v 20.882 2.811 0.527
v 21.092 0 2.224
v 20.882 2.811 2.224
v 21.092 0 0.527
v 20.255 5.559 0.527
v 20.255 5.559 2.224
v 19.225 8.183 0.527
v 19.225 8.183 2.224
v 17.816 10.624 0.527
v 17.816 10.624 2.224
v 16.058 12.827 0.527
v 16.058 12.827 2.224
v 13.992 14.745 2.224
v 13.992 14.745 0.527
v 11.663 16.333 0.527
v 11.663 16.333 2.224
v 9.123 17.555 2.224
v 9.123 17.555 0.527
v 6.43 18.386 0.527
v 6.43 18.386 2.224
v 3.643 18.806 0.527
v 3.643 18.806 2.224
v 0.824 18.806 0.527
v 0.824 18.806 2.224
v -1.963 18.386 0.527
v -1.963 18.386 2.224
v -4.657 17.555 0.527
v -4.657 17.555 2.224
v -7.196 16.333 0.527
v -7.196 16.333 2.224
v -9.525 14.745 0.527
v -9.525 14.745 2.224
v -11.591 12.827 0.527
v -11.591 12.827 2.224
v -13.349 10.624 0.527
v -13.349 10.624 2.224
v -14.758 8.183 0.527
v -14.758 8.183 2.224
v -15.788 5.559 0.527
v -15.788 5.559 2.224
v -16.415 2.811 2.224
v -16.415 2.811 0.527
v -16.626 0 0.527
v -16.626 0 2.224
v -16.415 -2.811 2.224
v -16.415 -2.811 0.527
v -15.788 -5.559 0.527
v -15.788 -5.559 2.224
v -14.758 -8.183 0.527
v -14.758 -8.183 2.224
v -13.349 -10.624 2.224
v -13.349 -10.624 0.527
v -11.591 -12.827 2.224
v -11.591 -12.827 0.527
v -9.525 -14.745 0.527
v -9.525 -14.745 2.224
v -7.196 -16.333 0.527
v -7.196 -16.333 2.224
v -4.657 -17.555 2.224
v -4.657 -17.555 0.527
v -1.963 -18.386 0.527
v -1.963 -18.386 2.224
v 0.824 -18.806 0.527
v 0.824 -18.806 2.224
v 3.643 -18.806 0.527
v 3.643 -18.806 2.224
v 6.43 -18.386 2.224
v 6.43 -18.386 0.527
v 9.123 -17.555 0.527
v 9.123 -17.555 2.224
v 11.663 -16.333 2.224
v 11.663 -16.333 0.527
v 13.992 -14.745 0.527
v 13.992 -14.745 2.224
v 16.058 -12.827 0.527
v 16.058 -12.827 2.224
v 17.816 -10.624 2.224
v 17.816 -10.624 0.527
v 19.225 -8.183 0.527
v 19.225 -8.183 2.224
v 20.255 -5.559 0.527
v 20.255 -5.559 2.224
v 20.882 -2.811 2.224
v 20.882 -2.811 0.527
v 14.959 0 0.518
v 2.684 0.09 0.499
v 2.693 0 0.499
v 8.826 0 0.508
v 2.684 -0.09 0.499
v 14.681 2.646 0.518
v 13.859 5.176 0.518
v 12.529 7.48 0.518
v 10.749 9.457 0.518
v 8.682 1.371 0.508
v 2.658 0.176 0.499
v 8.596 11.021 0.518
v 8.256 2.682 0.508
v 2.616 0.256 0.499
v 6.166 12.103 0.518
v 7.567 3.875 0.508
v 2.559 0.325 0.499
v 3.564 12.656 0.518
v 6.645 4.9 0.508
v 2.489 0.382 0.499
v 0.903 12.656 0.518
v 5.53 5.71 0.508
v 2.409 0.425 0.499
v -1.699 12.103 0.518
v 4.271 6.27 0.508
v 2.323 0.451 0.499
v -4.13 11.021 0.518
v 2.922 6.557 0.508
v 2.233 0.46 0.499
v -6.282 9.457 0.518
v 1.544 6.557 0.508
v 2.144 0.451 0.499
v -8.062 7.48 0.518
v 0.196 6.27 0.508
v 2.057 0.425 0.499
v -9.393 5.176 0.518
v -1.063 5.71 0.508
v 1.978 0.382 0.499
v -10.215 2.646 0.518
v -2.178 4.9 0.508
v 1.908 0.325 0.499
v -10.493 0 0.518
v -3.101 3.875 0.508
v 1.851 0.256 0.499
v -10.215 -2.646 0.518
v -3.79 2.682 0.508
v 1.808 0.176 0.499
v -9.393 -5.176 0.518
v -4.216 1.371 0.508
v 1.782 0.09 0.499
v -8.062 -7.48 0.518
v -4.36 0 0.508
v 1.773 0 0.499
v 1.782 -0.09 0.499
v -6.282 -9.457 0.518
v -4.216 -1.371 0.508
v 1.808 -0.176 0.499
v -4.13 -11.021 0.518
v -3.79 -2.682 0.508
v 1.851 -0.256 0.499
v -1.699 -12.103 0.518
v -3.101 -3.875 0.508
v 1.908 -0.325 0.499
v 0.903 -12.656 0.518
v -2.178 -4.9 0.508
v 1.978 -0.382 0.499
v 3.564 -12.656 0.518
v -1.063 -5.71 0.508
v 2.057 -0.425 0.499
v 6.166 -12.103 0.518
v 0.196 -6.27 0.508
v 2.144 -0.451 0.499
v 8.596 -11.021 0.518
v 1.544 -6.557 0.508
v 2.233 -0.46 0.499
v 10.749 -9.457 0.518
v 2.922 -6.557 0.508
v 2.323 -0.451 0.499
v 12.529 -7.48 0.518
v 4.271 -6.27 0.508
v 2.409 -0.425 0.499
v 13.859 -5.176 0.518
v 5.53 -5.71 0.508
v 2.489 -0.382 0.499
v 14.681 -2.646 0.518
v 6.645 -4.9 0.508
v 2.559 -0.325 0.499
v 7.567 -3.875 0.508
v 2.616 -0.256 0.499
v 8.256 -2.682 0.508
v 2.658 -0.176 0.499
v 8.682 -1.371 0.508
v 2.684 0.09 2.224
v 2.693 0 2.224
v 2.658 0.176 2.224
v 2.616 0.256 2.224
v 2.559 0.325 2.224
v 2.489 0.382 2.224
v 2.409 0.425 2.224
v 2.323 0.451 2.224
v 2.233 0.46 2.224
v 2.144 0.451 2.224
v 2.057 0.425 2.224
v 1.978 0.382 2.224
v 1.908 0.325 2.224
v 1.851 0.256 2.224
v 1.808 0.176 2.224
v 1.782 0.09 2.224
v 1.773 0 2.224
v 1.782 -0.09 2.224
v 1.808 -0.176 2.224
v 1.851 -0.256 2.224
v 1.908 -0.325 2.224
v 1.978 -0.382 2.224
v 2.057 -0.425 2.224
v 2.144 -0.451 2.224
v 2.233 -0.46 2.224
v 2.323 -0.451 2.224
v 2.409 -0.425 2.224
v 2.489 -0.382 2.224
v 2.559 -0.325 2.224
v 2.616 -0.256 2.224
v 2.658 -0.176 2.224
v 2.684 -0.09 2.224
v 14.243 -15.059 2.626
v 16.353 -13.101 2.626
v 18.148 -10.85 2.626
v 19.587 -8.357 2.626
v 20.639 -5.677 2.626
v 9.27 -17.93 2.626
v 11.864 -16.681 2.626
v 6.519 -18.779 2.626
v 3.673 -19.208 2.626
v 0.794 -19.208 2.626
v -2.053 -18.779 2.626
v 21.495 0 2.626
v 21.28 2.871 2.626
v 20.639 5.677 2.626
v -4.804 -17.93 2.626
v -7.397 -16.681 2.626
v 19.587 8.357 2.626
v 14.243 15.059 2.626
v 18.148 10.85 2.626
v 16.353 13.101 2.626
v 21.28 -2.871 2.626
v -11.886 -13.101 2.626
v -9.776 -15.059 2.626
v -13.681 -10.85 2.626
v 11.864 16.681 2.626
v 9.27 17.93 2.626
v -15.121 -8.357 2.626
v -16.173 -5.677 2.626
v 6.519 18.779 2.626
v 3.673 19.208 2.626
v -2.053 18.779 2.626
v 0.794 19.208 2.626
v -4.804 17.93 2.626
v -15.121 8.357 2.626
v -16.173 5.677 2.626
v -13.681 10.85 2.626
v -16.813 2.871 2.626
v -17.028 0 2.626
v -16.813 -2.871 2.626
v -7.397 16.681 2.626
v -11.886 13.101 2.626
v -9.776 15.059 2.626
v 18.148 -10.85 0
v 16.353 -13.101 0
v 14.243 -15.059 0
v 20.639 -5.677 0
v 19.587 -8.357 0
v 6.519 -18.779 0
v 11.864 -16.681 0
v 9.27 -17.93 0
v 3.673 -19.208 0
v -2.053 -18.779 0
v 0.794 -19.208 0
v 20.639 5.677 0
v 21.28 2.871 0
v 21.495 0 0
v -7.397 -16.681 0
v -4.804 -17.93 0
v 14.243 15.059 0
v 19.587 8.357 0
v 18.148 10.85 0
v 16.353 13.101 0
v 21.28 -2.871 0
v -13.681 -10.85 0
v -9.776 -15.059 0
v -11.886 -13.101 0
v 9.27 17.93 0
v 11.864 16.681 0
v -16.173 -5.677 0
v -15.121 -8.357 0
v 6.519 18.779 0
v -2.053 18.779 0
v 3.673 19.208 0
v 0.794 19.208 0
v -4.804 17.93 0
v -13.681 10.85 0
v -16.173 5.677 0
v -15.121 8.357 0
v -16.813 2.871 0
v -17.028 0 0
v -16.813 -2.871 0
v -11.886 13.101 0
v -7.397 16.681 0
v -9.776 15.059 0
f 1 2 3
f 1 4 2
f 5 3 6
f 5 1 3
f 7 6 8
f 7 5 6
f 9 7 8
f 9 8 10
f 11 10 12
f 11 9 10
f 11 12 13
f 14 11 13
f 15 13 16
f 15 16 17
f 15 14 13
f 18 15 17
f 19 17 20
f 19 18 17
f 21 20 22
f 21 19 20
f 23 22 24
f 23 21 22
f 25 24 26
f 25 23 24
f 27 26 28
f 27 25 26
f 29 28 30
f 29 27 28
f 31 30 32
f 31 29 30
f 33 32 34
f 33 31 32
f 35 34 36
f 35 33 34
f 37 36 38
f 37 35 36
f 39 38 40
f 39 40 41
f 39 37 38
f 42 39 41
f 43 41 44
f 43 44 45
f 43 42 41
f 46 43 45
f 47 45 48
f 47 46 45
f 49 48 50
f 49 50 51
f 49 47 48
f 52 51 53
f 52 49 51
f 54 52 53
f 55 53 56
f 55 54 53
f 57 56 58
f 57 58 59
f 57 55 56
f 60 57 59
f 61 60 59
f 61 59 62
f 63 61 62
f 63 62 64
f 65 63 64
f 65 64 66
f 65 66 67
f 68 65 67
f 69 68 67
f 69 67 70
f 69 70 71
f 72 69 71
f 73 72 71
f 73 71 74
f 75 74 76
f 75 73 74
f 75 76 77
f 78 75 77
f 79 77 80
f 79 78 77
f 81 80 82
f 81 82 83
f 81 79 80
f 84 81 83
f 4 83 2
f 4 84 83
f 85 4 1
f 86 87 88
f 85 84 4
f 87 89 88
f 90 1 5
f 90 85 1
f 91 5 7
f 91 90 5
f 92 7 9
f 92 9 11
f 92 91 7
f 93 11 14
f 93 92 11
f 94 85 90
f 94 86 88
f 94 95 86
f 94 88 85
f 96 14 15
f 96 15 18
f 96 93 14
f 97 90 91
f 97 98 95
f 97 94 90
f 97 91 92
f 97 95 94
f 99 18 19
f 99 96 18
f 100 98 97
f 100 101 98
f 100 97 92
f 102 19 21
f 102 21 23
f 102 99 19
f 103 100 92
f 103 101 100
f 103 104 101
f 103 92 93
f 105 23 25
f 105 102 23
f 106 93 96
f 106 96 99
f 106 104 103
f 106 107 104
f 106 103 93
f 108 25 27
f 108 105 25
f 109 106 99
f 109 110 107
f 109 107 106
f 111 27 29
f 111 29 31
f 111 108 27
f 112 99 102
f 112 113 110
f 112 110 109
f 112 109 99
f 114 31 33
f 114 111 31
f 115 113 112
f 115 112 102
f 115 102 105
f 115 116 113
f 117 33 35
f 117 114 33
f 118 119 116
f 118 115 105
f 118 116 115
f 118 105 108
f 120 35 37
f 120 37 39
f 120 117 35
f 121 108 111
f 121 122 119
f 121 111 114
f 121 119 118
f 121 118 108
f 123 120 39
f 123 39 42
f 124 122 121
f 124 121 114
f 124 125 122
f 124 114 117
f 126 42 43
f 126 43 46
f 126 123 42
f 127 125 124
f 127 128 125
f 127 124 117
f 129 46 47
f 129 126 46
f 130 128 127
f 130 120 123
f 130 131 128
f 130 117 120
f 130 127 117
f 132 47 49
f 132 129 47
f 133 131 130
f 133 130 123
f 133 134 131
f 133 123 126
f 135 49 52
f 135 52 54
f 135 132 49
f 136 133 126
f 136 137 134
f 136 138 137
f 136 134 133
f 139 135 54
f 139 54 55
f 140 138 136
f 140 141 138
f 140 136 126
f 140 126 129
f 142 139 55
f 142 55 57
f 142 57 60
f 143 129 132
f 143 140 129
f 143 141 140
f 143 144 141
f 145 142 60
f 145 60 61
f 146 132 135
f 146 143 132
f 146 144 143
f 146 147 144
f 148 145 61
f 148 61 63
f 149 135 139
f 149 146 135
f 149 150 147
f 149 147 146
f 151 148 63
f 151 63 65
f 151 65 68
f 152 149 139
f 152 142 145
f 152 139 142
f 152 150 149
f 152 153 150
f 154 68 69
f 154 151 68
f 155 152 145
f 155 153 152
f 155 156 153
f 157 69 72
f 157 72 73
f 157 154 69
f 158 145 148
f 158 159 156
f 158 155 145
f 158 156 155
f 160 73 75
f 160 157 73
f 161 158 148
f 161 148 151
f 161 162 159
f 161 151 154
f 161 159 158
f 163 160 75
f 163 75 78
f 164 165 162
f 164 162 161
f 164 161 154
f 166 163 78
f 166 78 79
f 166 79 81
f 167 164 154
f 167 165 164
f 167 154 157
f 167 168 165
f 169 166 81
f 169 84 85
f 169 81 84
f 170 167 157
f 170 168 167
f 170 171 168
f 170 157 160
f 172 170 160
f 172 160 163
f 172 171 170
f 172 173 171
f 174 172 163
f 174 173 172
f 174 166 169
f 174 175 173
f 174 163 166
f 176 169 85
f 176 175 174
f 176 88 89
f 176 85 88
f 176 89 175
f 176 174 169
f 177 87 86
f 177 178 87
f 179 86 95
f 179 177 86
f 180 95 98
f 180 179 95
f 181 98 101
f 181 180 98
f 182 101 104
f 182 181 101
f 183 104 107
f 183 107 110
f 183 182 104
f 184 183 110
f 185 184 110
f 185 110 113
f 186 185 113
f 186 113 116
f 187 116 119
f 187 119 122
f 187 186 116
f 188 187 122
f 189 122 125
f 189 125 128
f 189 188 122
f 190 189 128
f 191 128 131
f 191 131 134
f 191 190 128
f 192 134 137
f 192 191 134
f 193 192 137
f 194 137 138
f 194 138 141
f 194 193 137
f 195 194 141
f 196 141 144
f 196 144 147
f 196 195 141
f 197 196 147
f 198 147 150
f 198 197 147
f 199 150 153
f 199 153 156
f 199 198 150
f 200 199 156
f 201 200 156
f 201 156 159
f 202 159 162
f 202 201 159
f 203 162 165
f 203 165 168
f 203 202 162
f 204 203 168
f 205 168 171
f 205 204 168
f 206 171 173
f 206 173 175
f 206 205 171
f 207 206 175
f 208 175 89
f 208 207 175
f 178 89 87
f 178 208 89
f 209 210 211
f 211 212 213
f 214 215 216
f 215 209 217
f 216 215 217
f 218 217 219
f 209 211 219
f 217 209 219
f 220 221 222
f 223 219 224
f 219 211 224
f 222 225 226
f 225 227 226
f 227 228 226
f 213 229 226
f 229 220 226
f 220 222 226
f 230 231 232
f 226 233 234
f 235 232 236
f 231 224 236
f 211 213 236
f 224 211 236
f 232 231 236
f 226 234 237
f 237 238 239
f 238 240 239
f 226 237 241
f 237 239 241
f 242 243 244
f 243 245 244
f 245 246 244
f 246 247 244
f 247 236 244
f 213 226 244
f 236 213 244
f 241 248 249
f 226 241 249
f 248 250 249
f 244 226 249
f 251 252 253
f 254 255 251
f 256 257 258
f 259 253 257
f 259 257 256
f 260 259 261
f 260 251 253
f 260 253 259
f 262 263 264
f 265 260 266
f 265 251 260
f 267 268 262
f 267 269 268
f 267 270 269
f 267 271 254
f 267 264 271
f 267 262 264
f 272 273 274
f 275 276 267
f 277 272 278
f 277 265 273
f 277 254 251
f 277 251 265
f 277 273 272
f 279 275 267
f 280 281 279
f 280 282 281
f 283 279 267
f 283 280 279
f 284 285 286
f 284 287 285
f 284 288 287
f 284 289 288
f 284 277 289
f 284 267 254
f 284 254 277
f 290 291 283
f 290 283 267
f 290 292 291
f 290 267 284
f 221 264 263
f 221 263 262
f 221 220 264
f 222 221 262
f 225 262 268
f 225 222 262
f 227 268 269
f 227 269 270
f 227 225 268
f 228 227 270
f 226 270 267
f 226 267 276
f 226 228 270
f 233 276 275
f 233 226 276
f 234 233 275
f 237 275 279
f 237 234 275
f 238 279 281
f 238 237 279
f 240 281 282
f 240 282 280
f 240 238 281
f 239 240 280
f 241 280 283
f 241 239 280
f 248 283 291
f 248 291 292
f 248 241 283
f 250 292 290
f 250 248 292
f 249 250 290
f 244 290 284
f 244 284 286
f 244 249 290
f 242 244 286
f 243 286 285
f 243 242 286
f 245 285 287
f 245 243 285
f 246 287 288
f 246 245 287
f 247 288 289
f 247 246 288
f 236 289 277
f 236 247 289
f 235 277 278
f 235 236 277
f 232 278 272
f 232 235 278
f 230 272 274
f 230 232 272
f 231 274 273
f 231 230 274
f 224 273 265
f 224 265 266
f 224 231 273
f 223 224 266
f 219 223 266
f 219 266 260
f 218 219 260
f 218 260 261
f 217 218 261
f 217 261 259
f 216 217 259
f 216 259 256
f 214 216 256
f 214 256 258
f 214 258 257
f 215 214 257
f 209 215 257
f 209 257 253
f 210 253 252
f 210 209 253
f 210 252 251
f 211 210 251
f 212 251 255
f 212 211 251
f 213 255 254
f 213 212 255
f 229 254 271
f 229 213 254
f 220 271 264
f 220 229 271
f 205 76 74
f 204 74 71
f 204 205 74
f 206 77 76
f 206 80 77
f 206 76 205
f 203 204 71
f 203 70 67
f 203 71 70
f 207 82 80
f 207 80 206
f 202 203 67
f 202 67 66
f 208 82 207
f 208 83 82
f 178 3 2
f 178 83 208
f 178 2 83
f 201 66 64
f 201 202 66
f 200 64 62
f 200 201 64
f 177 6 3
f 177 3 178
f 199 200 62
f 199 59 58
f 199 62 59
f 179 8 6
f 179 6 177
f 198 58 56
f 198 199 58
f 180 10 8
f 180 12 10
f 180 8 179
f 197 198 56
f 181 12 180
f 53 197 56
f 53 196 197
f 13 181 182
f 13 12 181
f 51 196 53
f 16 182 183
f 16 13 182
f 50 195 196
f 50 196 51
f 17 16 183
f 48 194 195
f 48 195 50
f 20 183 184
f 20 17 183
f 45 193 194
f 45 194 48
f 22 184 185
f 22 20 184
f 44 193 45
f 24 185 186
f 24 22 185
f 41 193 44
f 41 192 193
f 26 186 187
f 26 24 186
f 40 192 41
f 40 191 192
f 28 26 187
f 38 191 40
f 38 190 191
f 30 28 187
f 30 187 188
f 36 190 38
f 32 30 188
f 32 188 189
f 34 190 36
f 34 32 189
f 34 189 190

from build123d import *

# Parameters (mm, degrees)
F0_W = 19.261638
F0_H = 2.626098


with BuildPart() as f1:
    # F0 (on Front) → F1 (revolve)
    with BuildSketch(Plane.XZ):
        with Locations((11.864158, 1.313049)):
            Rectangle(F0_W, F0_H)
        Polygon((21.092495, 0.527442), (2.693319, 0.498693), (2.693319, 2.223616), (21.092495, 2.223616), align=None, mode=Mode.SUBTRACT)
    revolve(axis=Axis((2.233339, 0, 1.313049), (0, 0, 1)))


solid = f1.part
